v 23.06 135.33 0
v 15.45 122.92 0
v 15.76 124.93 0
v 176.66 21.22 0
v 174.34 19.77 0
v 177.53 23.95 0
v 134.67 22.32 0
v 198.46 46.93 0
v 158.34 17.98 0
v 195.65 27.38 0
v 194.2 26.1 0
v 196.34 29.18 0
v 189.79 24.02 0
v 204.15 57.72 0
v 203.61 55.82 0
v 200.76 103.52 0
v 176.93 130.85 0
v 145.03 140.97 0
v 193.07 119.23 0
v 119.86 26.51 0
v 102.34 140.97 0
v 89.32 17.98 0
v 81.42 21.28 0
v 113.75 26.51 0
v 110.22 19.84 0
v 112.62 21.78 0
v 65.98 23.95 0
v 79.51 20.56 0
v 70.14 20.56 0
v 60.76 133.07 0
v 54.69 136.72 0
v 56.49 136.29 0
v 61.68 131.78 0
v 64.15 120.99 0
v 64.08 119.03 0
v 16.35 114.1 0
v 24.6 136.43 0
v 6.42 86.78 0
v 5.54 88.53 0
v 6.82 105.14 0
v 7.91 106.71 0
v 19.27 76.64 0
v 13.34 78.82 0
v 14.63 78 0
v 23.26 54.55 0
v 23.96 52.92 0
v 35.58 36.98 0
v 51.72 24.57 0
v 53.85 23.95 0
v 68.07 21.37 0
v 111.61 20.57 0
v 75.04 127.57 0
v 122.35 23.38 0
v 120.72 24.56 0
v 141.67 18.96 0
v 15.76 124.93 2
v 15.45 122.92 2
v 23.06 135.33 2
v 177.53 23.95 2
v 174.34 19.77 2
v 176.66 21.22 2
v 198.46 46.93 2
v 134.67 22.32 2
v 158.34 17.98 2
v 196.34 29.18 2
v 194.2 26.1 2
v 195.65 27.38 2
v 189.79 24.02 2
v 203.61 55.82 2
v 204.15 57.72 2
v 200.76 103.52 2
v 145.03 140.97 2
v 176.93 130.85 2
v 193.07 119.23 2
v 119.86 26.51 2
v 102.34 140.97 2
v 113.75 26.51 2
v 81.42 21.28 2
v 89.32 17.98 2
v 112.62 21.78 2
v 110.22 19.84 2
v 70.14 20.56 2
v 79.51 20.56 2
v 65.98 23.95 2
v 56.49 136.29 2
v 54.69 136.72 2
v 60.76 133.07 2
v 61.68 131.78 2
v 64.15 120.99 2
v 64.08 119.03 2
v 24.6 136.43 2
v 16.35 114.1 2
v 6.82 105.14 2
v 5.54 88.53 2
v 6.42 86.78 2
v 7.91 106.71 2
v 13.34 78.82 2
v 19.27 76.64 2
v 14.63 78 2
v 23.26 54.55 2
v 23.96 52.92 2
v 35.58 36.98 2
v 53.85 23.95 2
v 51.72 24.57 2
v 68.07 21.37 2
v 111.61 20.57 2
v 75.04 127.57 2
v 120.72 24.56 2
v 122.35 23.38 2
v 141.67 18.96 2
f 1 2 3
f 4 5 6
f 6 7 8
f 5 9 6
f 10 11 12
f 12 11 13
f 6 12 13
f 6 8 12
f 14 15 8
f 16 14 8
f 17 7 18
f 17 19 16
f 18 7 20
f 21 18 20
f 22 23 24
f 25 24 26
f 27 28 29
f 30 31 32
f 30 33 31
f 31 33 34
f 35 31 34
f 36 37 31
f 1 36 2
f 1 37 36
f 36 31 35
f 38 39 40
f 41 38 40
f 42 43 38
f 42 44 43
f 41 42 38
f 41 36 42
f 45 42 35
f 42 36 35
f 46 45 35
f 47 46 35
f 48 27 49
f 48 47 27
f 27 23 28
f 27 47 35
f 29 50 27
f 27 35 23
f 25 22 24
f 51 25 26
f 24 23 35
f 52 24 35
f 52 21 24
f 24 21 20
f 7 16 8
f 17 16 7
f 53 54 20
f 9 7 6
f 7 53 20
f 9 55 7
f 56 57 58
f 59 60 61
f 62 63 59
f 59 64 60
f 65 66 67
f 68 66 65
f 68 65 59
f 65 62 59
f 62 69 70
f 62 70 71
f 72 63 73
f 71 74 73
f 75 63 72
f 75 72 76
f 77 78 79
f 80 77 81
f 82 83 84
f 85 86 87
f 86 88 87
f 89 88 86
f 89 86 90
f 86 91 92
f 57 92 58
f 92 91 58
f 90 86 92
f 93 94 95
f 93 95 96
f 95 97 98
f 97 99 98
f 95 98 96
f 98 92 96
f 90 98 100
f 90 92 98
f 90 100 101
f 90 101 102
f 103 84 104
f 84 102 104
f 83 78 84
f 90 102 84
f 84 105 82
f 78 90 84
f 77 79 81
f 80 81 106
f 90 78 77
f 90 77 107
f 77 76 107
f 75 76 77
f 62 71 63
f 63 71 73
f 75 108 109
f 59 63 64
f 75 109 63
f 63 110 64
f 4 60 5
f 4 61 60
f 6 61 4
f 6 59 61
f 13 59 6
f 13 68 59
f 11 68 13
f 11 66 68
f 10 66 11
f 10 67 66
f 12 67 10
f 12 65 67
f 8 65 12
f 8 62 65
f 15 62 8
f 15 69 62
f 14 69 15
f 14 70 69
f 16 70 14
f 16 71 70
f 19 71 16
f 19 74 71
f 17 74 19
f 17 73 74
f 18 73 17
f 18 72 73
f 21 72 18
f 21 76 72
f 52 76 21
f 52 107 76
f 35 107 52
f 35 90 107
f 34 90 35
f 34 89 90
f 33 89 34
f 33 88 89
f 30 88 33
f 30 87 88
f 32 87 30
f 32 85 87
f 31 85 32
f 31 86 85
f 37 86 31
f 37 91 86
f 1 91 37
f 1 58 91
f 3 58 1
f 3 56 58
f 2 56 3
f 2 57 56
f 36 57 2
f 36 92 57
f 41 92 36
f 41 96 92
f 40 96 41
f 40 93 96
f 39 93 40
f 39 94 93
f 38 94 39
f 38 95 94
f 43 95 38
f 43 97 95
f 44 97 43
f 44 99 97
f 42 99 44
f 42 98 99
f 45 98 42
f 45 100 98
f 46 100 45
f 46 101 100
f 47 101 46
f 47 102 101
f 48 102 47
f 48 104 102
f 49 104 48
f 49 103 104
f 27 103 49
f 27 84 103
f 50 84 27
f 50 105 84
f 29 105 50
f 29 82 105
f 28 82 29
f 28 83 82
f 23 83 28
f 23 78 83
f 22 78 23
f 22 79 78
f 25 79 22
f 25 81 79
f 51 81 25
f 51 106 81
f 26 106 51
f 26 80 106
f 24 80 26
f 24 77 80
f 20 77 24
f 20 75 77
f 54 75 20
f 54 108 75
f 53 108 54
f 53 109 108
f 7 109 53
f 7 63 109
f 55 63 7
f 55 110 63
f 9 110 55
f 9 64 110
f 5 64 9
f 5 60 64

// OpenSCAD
// ============================================================================
// 🏰 Main Street Electrical Parade (WDW 10K) - 3D TPU Armor Plate (BACK)
// Dimensions: 198.61mm x 122.99mm x 9.0mm
// Sized for Snapmaker U1 & Bambu Lab | Material: 95A TPU
// ============================================================================
$fn = 24;
front_thickness = 2.0;
total_thickness = 9.0;
contour_pts = [[24.6, 136.43], [54.69, 136.72], [56.49, 136.29], [60.76, 133.07], [61.68, 131.78], [64.15, 120.99], [64.08, 119.03], [75.04, 127.57], [102.34, 140.97], [145.03, 140.97], [176.93, 130.85], [193.07, 119.23], [200.76, 103.52], [204.15, 57.72], [203.61, 55.82], [198.46, 46.93], [196.34, 29.18], [195.65, 27.38], [194.2, 26.1], [189.79, 24.02], [177.53, 23.95], [176.66, 21.22], [174.34, 19.77], [158.34, 17.98], [141.67, 18.96], [134.67, 22.32], [122.35, 23.38], [120.72, 24.56], [119.86, 26.51], [113.75, 26.51], [112.62, 21.78], [111.61, 20.57], [110.22, 19.84], [89.32, 17.98], [81.42, 21.28], [79.51, 20.56], [70.14, 20.56], [68.07, 21.37], [65.98, 23.95], [53.85, 23.95], [51.72, 24.57], [35.58, 36.98], [23.96, 52.92], [23.26, 54.55], [19.27, 76.64], [14.63, 78.0], [13.34, 78.82], [6.42, 86.78], [5.54, 88.53], [6.82, 105.14], [7.91, 106.71], [16.35, 114.1], [15.45, 122.92], [15.76, 124.93], [23.06, 135.33], [24.6, 136.43]];
ordered_leds = [];
fastener_tabs = [[24.59, 137.93], [61.03, 134.75], [80.72, 132.03], [115.43, 142.47], [151.99, 140.34], [185.75, 126.35], [202.91, 94.81], [205.6, 58.3], [193.22, 23.98], [159.02, 16.55], [123.23, 21.8], [93.26, 16.83], [58.89, 22.45], [29.17, 43.22], [17.61, 75.57], [7.14, 108.02]];

linear_extrude(front_thickness) polygon(contour_pts);
